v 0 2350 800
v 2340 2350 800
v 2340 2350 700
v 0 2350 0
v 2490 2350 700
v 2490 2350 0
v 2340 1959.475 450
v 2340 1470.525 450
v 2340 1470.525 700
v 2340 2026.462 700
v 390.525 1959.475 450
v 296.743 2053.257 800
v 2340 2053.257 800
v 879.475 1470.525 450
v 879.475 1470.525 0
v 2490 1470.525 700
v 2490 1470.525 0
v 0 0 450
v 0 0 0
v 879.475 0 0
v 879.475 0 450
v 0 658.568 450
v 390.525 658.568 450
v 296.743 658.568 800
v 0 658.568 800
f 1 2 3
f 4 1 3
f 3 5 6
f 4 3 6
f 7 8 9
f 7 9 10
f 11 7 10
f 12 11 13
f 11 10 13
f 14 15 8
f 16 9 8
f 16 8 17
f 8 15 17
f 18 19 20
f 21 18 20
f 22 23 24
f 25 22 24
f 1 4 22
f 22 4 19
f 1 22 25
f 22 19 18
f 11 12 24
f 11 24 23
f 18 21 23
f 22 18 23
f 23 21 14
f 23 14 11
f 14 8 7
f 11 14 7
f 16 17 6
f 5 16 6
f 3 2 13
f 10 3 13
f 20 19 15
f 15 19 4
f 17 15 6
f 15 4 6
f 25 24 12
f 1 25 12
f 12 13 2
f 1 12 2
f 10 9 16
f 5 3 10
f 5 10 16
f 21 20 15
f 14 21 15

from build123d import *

# Parameters (mm, degrees)
F1_DEPTH = 450
F2_W     = 879.475
F2_H     = 150
F2_W_2   = 150
F2_H_2   = 879.475
F3_DEPTH = 250
F5_DEPTH = 2200
F8_W     = 658.5683822632
F8_H     = 350
F9_DEPTH = 879.476


with BuildPart() as f1:
    # F0 (on Top) → F1 (new body)
    with BuildSketch(Plane.XY):
        Polygon((0, 2350), (0, 0), (879.475, 0), (879.475, 1470.525), (2490, 1470.525), (2490, 2350), align=None)
    extrude(amount=F1_DEPTH)

    # F2 (on face) → F3 (join)
    with BuildSketch(Plane.XY.offset(450)):
        with Locations((439.7375, 75)):
            Rectangle(F2_W, F2_H)
        with Locations((2415, 1910.2625)):
            Rectangle(F2_W_2, F2_H_2)
    extrude(amount=F3_DEPTH)

    # F4 (on face) → F5 (join, through all)
    with BuildSketch(Plane(origin=(0, 150, 0), x_dir=(-1, 0, 0), z_dir=(0, 1, 0))):
        Polygon((-390.525, 450), (0, 450), (0, 800), (-296.7427826491, 800), align=None)
    extrude(amount=F5_DEPTH)

    # F6 (on face) → F7 (join, up to the next surface of F1)
    with BuildSketch(Plane(origin=(2340, 0, 0), x_dir=(0, -1, 0), z_dir=(-1, 0, 0))):
        Polygon((-2350, 800), (-2350, 450), (-1959.475, 450), (-2053.2572173509, 800), align=None)
    extrude(until=Until.NEXT)

    # F8 (on face) → F9 (cut, through all)
    with BuildSketch(Plane.YZ.offset(879.475)):
        with Locations((329.2841911316, 625)):
            Rectangle(F8_W, F8_H)
    extrude(amount=-F9_DEPTH, mode=Mode.SUBTRACT)


solid = f1.part
